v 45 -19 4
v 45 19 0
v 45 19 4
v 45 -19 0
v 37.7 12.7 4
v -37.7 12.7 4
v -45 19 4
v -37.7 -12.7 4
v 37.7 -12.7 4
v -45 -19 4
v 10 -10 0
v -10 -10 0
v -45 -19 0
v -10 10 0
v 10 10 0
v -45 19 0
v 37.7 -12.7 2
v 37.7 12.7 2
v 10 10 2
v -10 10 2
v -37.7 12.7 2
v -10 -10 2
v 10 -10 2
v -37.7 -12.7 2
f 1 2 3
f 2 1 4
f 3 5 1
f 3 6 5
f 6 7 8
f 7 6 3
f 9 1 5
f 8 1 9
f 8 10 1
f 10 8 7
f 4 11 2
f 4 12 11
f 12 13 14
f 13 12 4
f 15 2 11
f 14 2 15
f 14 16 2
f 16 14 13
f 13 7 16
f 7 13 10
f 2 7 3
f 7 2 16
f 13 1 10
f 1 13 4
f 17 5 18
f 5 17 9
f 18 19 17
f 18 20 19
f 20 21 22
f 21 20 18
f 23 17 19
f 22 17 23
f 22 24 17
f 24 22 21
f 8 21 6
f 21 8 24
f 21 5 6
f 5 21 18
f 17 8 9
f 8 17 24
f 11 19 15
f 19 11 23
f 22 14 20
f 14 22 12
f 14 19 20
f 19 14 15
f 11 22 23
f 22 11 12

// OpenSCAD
// proposed dry-sample holder, mm. unprinted, fit validation required.
// part = "tray", "spacer", "mask", or "assembly".
part="tray";
slide_l=75; slide_w=25; clearance=0.4;
outer_l=90; outer_w=38; height=4; floor=2;
aperture=20; spacer_height=8;
assert(slide_w+clearance<outer_w);
assert(slide_l+clearance<outer_l);
assert(aperture<slide_w);
module tray(){
 difference(){
  translate([-outer_l/2,-outer_w/2,0]) cube([outer_l,outer_w,height]);
  translate([-(slide_l+clearance)/2,-(slide_w+clearance)/2,floor])
    cube([slide_l+clearance,slide_w+clearance,height]);
  translate([-aperture/2,-aperture/2,-1]) cube([aperture,aperture,height+2]);
 }
}
module spacer(){cube([8,8,spacer_height]);}
module mask(){difference(){cube([30,30,1]);translate([5,5,-1])cube([20,20,3]);}}
if(part=="tray")tray();
if(part=="spacer")spacer();
if(part=="mask")mask();
if(part=="assembly"){
 translate([0,0,spacer_height])tray();
 for(x=[-45,37])for(y=[-19,11])translate([x,y,0])spacer();
 // transparent slide is only a dimensional envelope, not a printed part
 color([0.3,0.7,1,0.3])translate([-37.5,-12.5,spacer_height+floor])cube([75,25,1]);
}
